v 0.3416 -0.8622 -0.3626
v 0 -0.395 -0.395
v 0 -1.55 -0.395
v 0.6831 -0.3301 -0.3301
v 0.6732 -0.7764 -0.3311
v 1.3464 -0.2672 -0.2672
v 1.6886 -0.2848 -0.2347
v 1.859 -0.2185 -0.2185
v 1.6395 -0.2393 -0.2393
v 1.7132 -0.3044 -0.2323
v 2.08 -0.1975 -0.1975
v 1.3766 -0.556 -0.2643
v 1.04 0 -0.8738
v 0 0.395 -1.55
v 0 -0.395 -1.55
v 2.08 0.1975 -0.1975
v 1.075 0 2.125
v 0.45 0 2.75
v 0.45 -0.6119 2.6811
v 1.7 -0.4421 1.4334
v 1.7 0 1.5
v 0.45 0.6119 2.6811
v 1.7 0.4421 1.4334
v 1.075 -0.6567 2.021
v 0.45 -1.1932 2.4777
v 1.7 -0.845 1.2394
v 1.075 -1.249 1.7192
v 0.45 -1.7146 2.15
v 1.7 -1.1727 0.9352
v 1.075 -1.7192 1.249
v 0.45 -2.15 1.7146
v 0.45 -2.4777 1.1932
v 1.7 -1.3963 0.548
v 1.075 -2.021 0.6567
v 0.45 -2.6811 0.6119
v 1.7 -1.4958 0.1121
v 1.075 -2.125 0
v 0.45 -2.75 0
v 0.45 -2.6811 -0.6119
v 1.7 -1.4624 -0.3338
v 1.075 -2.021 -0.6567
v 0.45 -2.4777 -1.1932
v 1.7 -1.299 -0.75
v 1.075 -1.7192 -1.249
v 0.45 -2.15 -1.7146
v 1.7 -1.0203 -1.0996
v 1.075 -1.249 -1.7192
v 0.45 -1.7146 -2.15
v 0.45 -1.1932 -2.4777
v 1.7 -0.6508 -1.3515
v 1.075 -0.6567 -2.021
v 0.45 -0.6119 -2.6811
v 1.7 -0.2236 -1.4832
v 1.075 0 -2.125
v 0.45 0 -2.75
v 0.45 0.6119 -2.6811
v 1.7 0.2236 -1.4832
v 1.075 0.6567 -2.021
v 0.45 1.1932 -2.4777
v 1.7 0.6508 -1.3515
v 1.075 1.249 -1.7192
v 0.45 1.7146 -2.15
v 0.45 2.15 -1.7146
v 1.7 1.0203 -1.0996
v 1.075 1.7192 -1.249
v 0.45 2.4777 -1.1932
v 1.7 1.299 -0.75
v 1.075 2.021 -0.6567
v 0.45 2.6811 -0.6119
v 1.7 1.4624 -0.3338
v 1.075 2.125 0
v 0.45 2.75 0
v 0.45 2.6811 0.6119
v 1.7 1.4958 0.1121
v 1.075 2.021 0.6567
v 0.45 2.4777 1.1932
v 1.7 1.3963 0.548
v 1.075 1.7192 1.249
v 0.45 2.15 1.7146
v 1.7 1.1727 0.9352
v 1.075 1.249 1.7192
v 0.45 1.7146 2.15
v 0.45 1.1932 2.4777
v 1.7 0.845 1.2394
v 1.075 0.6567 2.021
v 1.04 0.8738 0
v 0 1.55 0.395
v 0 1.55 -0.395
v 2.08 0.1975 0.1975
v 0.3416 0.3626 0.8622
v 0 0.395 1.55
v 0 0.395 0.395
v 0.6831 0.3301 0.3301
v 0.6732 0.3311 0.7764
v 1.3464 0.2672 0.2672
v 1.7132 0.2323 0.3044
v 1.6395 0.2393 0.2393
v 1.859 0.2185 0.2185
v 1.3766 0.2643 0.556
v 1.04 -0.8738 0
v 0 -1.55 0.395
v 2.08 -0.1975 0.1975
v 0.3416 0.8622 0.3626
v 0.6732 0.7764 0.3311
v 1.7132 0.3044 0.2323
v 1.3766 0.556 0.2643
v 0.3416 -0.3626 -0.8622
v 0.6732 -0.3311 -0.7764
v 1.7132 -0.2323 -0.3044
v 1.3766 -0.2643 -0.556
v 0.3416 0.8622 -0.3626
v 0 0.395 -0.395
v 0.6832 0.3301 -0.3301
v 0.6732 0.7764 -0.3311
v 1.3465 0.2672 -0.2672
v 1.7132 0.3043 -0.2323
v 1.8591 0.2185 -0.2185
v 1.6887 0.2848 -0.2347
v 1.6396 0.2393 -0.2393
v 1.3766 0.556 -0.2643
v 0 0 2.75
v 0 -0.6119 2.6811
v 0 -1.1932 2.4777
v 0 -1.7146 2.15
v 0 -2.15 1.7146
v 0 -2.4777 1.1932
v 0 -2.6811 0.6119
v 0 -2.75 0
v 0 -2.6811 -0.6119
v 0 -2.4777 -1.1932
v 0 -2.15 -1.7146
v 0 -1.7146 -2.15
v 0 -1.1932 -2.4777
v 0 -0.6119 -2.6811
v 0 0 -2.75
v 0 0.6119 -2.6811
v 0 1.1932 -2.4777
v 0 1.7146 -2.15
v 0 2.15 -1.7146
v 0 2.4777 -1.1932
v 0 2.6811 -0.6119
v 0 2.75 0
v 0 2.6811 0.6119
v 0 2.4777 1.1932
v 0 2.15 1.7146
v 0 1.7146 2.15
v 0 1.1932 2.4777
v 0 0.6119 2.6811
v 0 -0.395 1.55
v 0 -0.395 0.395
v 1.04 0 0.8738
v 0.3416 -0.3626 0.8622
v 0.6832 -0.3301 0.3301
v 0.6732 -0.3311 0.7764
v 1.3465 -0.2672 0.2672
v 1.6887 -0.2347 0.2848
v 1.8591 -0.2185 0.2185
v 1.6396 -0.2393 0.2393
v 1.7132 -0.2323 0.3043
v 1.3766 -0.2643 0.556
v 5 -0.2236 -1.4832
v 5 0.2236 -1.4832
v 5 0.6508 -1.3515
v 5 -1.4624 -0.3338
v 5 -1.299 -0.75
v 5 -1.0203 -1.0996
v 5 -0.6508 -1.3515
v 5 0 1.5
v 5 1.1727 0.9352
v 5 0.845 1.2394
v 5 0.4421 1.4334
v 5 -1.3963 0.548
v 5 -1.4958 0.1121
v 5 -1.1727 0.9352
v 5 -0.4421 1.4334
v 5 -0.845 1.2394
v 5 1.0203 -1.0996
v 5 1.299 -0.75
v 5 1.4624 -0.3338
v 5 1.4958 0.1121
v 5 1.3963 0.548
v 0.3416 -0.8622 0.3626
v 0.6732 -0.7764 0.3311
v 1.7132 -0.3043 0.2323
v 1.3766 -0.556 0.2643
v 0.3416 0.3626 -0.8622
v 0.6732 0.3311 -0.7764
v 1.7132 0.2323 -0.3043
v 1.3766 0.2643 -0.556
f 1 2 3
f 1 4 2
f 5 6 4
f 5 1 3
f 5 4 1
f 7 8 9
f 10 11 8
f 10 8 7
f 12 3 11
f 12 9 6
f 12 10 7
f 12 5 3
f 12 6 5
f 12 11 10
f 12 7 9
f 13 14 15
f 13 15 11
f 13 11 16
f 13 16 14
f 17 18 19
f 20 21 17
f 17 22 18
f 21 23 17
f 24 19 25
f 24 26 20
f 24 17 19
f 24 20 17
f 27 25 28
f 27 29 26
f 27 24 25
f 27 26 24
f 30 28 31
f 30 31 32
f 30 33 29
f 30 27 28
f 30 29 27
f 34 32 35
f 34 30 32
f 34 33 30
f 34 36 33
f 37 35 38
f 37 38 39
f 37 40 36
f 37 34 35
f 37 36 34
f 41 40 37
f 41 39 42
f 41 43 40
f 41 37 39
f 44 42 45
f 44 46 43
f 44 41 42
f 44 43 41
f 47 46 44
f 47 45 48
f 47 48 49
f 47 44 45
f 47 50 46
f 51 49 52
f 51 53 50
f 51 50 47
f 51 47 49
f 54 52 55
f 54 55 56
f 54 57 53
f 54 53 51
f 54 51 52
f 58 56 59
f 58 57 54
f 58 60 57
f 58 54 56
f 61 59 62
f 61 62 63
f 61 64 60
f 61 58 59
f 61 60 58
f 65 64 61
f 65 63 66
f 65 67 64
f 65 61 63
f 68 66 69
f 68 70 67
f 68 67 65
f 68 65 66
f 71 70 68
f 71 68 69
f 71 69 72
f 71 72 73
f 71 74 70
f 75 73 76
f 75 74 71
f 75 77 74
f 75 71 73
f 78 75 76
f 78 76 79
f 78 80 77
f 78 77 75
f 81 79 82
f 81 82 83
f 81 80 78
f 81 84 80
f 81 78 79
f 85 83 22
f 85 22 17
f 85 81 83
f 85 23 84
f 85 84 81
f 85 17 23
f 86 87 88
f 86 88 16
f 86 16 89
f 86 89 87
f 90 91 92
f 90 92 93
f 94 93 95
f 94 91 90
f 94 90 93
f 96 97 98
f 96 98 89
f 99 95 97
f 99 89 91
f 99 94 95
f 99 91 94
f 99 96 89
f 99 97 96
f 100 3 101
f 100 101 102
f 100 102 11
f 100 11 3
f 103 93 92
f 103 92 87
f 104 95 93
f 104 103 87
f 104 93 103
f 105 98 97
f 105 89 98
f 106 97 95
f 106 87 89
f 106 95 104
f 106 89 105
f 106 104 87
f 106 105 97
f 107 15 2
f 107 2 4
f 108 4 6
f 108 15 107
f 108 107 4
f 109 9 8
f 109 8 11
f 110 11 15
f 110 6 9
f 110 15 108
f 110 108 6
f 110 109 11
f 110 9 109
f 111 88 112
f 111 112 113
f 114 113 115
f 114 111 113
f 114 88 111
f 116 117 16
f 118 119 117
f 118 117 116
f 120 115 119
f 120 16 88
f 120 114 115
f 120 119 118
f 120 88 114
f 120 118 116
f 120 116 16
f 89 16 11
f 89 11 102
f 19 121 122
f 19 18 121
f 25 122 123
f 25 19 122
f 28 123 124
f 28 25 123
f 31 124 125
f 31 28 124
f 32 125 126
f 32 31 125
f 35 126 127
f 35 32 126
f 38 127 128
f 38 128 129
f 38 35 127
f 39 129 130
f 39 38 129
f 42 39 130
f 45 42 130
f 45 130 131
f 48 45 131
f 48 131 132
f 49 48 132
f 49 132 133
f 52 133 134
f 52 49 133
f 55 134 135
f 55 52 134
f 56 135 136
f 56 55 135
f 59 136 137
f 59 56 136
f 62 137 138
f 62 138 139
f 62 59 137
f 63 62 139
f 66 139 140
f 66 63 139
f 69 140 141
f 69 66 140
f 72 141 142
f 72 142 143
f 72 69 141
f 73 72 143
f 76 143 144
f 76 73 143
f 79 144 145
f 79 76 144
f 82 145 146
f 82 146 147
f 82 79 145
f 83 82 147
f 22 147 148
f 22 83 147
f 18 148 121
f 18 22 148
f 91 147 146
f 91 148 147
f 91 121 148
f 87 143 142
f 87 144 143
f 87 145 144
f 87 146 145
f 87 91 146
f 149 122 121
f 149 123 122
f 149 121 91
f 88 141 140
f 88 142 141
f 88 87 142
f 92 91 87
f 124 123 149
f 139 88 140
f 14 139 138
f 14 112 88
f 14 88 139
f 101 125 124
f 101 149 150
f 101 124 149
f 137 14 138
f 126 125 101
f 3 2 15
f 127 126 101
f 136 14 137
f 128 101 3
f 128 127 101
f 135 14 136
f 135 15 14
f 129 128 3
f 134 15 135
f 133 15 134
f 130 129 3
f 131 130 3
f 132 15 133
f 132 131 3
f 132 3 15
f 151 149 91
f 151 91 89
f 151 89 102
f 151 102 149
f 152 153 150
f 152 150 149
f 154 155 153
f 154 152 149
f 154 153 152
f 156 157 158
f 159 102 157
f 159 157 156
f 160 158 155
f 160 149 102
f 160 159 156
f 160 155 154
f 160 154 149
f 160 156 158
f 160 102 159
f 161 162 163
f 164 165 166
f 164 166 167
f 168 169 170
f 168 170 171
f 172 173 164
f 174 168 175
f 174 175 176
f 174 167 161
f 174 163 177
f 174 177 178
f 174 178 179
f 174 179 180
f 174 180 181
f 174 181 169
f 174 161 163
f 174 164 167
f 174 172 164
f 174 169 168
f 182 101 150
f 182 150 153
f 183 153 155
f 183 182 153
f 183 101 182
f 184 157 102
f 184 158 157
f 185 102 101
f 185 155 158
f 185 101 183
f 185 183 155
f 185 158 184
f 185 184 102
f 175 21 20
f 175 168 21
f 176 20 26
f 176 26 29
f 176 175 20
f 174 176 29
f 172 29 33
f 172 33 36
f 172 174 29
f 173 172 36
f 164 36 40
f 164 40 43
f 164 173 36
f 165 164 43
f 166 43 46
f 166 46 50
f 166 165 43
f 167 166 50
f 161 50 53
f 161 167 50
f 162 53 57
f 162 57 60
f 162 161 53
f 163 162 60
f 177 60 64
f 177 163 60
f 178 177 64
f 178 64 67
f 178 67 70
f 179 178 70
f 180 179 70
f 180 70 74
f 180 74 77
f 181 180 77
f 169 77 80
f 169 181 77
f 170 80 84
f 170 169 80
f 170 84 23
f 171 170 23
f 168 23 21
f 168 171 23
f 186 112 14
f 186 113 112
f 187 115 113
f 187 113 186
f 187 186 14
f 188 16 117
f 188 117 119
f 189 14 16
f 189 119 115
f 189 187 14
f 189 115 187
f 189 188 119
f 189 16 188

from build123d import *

# Parameters (mm, degrees)
SKETCH3_W         = 0.79
SKETCH3_H         = 3.1
SKETCH4_W         = 0.395
SKETCH4_H         = 0.395
CIRPATTERN1_COUNT = 2
CIRPATTERN1_ANGLE = 90


with BuildPart() as part:
    # BodySke → Base-Revolve (revolve)
    with BuildSketch(Plane.XY, mode=Mode.PRIVATE) as base_revolve_sk:
        Polygon((0, 0), (0, 2.75), (0.45, 2.75), (1.7, 1.5), (5, 1.5), (5, 0), align=None)
    revolve(base_revolve_sk.sketch.rotate(Axis((-6.35, 0, 0), (1, 0, 0)), 90), axis=Axis((-6.35, 0, 0), (1, 0, 0)))  # turned: the seam where the file's is

    # Sketch3 → Cross section 0
    with BuildSketch(Plane.ZY):
        Rectangle(SKETCH3_W, SKETCH3_H)
    # Sketch4 → Cross section 1
    with BuildSketch(Plane.ZY.offset(-2.08)):
        Rectangle(SKETCH4_W, SKETCH4_H)
    cross = loft(mode=Mode.SUBTRACT)

    # CirPattern1: Cross ×2 about axis
    cirpattern1_axis = Axis((0, 0, 0), (1, 0, 0))
    for i in range(1, CIRPATTERN1_COUNT):
        add(cross.rotate(cirpattern1_axis, i * CIRPATTERN1_ANGLE / (CIRPATTERN1_COUNT - 1)), mode=Mode.SUBTRACT)


solid = part.part
